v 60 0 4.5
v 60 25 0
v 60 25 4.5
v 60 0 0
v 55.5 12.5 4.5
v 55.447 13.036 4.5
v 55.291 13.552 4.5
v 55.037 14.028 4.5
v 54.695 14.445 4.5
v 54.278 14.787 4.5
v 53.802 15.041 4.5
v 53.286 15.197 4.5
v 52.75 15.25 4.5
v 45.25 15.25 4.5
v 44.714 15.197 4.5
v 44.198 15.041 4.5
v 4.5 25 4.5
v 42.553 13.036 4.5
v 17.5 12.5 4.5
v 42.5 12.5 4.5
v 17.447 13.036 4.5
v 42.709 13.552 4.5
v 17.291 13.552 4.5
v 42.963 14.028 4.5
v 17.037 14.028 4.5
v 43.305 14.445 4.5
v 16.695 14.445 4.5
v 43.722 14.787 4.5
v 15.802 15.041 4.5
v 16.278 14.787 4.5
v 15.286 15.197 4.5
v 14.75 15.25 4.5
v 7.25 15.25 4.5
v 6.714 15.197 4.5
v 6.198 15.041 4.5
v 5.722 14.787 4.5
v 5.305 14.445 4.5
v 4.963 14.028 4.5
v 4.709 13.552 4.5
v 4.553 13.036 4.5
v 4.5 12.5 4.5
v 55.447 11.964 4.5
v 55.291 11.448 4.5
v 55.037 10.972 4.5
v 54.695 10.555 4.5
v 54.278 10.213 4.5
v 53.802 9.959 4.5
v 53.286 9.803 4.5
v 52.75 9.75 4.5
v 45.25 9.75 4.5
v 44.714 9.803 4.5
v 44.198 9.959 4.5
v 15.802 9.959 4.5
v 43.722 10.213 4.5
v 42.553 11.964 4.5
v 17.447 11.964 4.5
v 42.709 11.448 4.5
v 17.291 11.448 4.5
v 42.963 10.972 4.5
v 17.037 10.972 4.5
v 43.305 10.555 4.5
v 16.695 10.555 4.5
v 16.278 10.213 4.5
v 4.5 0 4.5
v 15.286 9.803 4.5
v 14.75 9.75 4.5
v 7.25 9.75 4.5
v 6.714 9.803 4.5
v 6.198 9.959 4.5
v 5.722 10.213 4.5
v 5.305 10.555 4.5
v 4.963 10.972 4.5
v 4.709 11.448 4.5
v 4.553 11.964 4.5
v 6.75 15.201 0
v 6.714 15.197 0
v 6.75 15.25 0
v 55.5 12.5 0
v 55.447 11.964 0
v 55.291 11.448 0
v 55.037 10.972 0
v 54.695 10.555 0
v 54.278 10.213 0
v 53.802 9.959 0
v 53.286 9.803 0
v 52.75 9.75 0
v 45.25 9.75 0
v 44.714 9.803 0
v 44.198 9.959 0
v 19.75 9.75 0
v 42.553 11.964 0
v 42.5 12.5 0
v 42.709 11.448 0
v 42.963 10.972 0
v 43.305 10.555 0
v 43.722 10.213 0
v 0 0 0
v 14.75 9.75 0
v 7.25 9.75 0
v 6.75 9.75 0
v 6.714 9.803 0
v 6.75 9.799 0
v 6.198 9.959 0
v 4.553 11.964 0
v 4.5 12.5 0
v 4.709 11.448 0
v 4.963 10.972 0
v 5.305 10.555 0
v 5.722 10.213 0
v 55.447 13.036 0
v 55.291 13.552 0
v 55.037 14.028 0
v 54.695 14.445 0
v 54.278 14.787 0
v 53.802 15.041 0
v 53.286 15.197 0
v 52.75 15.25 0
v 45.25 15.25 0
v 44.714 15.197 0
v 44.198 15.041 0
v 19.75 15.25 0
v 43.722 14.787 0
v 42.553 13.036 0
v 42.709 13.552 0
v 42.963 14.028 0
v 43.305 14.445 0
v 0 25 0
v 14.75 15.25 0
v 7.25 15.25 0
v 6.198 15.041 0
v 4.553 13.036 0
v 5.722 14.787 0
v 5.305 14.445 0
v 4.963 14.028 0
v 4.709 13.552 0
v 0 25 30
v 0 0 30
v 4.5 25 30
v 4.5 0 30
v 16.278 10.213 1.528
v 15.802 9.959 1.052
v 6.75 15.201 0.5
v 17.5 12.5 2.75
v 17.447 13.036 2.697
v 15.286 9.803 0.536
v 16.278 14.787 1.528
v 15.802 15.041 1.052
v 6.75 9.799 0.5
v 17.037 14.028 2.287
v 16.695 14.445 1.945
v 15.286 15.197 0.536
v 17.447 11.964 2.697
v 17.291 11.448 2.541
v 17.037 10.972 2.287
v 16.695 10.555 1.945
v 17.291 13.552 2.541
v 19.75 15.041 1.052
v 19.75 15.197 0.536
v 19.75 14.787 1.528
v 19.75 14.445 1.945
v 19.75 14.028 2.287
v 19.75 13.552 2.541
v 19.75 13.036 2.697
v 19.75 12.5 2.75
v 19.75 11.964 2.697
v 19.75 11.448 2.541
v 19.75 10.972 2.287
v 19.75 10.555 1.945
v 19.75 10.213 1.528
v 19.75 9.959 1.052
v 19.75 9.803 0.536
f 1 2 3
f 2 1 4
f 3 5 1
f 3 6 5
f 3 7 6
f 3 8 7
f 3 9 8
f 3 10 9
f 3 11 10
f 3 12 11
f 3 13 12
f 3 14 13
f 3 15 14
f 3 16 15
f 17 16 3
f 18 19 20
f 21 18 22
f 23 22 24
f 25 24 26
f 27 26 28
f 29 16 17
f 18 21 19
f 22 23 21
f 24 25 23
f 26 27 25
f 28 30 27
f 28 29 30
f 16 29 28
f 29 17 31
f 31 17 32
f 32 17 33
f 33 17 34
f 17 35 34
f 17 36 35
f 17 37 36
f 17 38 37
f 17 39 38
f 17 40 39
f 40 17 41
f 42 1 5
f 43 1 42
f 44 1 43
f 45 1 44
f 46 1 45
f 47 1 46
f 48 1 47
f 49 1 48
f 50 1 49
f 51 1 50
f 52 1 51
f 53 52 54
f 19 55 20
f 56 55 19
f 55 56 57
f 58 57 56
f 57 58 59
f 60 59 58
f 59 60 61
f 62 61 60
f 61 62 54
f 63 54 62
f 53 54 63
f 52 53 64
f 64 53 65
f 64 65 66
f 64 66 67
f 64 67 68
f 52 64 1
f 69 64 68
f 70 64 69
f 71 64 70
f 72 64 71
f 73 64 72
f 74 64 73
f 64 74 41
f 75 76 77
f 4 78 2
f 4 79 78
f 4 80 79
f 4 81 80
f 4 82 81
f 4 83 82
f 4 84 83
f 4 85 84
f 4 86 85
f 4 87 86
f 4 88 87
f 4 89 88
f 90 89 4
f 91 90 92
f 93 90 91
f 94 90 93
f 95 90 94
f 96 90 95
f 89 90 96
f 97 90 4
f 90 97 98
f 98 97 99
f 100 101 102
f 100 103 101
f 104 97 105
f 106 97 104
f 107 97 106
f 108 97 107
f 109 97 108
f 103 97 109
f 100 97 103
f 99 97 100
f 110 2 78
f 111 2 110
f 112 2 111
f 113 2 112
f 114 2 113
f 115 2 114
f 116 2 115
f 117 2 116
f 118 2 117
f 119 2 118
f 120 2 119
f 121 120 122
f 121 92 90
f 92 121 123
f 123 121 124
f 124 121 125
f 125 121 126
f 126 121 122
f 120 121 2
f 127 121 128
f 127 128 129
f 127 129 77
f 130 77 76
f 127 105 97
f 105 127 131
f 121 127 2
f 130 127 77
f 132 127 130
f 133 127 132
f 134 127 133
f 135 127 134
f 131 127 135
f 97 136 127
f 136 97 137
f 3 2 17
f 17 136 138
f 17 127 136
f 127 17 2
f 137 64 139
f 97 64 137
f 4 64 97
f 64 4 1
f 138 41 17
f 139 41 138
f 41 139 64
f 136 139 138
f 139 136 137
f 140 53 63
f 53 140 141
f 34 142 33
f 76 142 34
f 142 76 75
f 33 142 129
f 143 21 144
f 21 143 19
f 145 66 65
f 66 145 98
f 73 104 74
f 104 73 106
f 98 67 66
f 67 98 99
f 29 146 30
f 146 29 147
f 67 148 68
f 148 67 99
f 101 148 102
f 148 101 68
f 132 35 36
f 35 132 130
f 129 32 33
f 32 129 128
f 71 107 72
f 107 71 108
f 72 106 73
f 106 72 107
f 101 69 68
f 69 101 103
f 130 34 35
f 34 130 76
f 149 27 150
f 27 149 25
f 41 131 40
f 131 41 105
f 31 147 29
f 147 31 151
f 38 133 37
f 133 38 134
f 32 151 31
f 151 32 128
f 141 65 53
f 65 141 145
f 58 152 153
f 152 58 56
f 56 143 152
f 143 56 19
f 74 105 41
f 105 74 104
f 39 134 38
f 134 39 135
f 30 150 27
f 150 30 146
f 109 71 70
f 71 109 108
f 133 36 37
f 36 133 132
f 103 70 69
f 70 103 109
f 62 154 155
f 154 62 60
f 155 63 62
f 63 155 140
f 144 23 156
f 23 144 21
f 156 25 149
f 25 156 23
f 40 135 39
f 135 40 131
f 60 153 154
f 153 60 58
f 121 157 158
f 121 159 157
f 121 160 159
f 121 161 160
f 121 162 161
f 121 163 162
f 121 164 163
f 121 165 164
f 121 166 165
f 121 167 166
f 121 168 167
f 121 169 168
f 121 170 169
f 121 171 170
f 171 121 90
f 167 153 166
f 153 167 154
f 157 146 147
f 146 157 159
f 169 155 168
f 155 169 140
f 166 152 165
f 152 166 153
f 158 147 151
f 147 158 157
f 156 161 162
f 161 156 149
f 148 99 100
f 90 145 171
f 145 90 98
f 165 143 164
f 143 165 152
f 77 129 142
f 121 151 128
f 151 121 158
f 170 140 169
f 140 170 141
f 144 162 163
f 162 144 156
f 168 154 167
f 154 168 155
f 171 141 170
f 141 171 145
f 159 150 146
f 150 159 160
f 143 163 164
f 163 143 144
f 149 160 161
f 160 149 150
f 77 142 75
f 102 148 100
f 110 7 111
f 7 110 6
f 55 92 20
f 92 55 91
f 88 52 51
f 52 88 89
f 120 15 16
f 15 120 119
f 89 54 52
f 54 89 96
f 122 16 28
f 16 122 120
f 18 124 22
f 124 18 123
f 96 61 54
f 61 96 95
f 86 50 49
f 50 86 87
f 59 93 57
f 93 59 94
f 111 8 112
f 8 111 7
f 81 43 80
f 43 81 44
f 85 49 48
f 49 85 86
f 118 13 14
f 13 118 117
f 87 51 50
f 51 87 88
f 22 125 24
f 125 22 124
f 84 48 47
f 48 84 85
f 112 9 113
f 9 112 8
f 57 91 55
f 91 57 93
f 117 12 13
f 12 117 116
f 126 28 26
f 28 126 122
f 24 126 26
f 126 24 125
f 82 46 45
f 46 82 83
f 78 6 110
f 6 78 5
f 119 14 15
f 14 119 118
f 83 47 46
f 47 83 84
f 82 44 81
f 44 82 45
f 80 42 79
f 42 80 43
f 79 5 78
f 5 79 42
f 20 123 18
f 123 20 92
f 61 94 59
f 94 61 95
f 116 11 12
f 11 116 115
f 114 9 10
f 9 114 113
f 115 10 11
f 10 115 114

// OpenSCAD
$fn = 32;

// ----------------------------------------------------------------------
// L-bracket: 60 x 25 x 30 mm
// ----------------------------------------------------------------------

// --- parameters (mm) ---
horiz_len = 60;           // horizontal leg, X
vert_len = 30;            // vertical leg, Z
profile_w = 25;           // bracket depth, Y
plate_t = 4.5;            // plate thickness
hole_d = 5.5;             // clearance for M5
slot_w = 5.5;             // euro screw slot width
slot_l = 13;              // euro screw slot length

module hole_z(px, py) {
  translate([px, py, -0.5]) cylinder(h = plate_t + 1, d = hole_d);
}
module hole_x(pz, py) {
  translate([-0.5, py, pz]) rotate([0, 90, 0]) cylinder(h = plate_t + 1, d = hole_d);
}
module euro_slot_z(px, py) {
  hull() {
    translate([px - (slot_l - slot_w) / 2, py, -0.5]) cylinder(h = plate_t + 1, d = slot_w);
    translate([px + (slot_l - slot_w) / 2, py, -0.5]) cylinder(h = plate_t + 1, d = slot_w);
  }
}
module euro_slot_x(pz, py) {
  translate([-0.5, 0, 0]) rotate([0, 90, 0]) hull() {
    translate([0, py, pz - (slot_l - slot_w) / 2]) cylinder(h = plate_t + 1, d = slot_w);
    translate([0, py, pz + (slot_l - slot_w) / 2]) cylinder(h = plate_t + 1, d = slot_w);
  }
}

difference() {
  union() {
    /* horizontal leg */
    cube([horiz_len, profile_w, plate_t]);
    /* vertical leg, overlapping the corner block */
    cube([plate_t, profile_w, vert_len]);
  }
  euro_slot_z(11, 12.5);
  euro_slot_x(11, 12.5);
  euro_slot_z(49, 12.5);
}
